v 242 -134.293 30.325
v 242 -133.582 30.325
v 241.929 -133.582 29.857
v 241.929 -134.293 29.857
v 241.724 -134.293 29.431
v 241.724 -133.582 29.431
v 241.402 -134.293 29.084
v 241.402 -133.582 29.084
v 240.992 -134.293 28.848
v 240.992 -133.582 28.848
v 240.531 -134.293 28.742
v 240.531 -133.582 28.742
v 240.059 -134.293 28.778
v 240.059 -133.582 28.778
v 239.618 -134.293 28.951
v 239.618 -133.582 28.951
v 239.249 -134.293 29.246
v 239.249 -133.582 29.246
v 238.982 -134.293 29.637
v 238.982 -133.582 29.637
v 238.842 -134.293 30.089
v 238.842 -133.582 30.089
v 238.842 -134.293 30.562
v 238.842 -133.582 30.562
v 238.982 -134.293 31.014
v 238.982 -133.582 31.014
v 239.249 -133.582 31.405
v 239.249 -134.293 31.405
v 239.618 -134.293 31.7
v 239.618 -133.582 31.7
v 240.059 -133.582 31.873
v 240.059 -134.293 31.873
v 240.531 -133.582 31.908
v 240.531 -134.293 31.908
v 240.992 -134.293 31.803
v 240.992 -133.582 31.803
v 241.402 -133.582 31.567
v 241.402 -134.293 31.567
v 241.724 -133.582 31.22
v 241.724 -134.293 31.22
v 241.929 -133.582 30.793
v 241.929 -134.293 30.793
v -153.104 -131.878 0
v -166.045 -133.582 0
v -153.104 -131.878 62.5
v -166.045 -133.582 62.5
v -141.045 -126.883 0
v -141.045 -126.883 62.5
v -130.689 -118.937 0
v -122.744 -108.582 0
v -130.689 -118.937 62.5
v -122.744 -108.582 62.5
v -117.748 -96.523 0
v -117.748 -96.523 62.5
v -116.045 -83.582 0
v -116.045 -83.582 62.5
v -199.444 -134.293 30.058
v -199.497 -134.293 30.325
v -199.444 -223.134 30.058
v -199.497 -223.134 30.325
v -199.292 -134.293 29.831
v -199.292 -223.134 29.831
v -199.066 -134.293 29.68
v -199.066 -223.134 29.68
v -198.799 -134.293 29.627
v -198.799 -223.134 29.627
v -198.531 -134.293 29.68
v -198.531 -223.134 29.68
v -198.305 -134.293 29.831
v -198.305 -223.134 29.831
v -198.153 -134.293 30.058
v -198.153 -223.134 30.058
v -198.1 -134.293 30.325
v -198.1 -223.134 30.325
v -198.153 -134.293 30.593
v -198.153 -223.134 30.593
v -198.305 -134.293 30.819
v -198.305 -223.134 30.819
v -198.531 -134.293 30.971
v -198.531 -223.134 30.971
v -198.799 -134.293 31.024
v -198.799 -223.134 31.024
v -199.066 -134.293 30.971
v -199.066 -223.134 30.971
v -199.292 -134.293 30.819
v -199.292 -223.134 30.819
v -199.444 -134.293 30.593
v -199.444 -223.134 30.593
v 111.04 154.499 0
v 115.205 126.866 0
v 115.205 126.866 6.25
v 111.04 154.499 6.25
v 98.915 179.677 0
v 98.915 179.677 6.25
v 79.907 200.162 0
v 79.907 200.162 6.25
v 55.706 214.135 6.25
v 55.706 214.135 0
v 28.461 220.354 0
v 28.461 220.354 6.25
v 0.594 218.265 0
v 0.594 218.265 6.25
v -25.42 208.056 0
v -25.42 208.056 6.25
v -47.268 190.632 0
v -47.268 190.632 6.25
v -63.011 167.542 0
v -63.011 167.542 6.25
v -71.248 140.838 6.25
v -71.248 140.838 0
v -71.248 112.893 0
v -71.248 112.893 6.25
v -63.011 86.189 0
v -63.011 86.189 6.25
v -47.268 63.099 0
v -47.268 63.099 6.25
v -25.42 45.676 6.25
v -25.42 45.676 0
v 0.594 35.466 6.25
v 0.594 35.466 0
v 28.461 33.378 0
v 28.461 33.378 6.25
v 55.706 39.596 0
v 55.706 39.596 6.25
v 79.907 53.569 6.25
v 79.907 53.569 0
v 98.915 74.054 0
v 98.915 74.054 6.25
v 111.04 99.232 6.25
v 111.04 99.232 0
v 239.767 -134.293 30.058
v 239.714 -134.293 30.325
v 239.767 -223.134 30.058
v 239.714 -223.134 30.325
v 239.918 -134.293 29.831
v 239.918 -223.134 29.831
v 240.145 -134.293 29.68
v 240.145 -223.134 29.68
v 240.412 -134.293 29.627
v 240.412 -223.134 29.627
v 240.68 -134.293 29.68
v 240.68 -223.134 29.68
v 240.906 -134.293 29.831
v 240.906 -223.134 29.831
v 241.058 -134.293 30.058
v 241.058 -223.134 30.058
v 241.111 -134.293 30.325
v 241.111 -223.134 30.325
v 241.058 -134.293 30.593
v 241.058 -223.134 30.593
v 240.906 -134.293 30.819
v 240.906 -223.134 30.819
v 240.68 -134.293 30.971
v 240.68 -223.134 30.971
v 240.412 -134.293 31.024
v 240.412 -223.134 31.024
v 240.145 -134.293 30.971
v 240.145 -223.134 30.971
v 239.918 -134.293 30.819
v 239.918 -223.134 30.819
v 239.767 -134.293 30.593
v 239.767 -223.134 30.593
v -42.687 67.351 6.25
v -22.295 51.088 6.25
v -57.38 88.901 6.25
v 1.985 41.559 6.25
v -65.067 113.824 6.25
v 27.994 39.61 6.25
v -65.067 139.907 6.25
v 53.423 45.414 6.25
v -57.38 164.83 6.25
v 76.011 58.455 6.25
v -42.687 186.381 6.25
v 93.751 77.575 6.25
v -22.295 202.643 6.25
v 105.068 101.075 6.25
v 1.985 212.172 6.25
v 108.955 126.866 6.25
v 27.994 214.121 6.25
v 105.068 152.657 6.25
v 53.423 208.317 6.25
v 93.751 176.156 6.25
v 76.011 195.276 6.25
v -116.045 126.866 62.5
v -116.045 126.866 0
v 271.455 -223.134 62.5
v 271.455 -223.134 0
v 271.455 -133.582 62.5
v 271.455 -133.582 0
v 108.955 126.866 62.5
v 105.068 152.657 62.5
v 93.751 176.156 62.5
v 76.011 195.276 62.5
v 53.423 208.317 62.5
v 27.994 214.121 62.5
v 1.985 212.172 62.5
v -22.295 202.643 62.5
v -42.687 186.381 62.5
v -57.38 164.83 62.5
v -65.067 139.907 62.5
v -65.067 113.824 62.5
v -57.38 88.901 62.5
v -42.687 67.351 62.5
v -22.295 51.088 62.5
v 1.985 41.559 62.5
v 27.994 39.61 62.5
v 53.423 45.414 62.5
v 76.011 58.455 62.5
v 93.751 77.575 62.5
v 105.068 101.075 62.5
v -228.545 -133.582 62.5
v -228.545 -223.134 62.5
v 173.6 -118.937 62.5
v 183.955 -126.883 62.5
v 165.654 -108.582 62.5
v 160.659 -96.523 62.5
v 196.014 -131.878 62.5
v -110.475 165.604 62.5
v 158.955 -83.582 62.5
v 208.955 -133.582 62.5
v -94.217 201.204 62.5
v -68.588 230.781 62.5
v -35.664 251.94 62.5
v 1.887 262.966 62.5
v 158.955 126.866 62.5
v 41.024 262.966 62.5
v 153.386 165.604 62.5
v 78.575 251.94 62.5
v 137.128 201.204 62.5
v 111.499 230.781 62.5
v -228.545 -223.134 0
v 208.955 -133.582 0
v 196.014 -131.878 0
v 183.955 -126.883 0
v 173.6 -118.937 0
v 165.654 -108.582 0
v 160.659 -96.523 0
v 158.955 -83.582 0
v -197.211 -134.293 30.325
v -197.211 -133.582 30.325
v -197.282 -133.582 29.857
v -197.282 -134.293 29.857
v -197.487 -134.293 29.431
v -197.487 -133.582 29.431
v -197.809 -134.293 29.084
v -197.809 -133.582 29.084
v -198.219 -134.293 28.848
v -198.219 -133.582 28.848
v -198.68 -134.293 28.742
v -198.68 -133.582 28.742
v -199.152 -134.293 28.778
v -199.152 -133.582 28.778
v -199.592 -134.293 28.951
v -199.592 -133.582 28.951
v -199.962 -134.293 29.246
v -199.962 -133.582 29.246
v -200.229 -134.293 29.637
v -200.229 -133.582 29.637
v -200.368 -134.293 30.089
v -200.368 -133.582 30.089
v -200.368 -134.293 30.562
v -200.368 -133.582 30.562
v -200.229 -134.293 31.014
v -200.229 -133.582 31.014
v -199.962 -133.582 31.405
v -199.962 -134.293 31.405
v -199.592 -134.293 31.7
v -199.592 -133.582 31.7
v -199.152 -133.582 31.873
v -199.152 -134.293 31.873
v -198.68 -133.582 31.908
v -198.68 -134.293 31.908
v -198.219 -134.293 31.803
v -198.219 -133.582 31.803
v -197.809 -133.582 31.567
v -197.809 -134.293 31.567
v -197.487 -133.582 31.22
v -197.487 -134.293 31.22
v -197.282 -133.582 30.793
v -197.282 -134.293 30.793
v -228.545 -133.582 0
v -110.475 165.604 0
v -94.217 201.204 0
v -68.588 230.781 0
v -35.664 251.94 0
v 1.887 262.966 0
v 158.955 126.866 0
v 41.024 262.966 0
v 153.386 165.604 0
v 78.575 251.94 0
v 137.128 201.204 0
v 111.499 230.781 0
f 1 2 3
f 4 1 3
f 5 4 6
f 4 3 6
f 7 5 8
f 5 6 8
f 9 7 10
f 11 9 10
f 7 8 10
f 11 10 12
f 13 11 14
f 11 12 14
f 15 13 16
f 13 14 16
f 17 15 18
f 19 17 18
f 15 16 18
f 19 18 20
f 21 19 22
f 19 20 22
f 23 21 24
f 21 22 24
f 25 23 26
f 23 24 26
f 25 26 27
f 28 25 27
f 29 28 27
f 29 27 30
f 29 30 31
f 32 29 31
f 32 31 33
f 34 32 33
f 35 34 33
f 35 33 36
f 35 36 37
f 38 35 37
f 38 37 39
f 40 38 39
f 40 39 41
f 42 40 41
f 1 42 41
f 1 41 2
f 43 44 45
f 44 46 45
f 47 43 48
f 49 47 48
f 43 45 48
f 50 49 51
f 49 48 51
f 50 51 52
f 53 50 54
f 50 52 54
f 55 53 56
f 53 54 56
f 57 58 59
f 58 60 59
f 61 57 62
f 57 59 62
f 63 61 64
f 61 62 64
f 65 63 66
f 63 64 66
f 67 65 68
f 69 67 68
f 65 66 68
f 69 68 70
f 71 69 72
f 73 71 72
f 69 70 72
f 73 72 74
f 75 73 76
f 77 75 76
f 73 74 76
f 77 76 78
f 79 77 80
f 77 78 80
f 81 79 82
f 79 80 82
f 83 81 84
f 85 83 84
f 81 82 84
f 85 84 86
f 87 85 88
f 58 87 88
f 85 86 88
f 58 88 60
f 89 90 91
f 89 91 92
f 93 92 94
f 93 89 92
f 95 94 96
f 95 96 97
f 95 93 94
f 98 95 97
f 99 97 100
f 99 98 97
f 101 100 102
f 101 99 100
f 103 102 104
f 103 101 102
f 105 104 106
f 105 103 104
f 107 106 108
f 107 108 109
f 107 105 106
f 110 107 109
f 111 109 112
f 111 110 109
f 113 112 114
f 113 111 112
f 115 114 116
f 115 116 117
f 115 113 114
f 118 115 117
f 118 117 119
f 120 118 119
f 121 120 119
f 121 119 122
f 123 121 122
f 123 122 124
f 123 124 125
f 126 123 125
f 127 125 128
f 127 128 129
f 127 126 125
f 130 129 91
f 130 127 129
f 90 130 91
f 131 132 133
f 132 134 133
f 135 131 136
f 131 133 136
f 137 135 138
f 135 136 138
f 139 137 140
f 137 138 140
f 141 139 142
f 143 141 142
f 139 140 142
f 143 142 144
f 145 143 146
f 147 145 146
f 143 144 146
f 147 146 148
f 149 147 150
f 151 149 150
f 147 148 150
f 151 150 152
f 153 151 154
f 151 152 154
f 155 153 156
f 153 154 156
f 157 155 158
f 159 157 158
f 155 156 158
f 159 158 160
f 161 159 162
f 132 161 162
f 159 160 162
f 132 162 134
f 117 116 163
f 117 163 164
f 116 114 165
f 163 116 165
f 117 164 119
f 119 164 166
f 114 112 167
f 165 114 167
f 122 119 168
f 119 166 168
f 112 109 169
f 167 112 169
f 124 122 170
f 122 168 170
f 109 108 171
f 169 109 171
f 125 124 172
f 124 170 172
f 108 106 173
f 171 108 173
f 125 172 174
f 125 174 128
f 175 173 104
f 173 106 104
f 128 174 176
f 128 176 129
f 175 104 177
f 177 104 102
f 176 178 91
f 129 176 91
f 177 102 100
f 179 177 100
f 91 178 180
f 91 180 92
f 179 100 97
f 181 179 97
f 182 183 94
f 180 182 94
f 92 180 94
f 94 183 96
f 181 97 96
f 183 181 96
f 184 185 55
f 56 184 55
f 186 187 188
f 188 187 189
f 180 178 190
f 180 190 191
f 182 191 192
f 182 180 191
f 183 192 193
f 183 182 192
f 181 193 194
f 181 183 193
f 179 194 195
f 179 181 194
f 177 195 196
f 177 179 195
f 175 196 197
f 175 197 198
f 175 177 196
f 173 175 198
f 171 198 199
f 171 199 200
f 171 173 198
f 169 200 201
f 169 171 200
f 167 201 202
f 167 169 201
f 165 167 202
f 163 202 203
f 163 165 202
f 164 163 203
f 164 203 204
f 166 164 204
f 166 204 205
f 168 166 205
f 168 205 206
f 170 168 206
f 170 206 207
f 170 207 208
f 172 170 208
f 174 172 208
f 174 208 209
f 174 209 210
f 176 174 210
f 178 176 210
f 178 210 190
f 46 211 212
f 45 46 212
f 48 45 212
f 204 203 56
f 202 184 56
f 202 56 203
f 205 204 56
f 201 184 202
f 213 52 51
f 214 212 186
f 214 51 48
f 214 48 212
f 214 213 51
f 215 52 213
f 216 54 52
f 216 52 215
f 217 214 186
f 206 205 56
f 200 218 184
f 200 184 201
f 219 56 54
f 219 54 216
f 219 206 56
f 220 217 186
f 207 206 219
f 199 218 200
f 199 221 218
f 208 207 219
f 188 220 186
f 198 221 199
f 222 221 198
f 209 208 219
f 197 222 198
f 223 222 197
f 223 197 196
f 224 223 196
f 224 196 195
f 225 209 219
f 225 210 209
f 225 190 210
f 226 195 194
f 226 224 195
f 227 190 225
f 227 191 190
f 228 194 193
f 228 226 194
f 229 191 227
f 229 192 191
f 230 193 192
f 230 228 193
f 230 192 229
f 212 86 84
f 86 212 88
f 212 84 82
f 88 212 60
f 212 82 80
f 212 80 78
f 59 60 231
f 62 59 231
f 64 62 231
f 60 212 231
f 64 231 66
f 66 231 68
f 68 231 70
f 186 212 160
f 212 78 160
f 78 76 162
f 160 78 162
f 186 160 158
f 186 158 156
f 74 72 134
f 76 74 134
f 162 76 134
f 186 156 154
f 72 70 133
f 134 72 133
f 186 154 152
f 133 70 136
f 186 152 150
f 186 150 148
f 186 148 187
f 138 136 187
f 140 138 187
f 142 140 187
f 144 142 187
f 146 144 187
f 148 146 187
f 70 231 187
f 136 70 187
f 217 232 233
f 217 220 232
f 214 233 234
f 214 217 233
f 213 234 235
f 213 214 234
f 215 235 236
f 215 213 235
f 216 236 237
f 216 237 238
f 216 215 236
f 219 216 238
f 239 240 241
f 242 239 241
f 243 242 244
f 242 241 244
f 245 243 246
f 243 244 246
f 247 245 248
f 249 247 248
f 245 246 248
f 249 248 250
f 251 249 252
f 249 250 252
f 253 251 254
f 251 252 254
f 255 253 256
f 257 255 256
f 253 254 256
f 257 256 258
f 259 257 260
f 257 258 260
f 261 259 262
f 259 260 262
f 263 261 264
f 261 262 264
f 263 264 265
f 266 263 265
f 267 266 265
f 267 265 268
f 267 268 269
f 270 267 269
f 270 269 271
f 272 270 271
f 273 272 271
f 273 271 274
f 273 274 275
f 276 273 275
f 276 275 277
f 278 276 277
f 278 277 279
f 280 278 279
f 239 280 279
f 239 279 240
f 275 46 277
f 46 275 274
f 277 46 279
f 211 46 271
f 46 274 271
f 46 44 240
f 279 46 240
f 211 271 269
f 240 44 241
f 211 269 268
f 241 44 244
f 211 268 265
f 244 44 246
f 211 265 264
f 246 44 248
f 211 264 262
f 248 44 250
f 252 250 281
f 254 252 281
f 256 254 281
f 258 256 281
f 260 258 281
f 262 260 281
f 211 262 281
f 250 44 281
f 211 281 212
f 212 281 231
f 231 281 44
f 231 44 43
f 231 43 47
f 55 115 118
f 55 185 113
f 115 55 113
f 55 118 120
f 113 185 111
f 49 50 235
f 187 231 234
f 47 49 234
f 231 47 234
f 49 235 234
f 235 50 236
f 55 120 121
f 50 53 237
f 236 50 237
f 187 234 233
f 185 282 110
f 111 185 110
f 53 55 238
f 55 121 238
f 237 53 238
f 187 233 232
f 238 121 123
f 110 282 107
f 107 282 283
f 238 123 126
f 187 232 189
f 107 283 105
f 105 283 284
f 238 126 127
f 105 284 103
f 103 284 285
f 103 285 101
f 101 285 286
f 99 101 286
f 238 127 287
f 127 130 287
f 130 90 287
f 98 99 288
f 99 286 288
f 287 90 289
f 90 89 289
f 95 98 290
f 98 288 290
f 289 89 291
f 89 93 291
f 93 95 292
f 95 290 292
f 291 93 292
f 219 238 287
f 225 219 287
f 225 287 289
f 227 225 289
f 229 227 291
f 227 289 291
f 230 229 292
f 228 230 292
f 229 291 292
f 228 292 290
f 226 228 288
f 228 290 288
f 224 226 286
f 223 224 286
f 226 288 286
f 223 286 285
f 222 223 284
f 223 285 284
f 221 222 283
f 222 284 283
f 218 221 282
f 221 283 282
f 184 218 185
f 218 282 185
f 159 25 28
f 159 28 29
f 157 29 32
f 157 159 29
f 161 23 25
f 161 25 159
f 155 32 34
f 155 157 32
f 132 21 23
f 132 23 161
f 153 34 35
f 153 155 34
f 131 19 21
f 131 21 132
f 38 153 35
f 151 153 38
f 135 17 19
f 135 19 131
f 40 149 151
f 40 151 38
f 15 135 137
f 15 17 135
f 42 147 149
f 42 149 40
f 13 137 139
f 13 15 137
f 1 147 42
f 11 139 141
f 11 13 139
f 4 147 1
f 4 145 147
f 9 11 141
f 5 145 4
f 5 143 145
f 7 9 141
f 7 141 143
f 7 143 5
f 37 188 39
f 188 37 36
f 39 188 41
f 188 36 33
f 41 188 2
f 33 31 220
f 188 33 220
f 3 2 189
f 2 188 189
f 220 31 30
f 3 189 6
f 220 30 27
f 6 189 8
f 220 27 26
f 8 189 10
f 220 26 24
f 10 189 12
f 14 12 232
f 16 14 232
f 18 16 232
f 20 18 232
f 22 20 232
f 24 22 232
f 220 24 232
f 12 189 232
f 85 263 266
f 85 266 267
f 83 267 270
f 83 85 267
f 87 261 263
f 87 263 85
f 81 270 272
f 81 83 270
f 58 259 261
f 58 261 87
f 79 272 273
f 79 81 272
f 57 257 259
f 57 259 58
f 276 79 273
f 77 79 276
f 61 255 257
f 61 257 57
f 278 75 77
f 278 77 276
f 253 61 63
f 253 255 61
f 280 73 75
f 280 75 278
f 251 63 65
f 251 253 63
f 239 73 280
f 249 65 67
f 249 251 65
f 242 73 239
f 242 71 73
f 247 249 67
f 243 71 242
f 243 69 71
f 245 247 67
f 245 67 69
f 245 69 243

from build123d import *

# Parameters (mm, degrees)
SKETCH1_R                                           = 87.5
BOSS_EXTRUDE1_DEPTH                                 = 62.5
FILLET1_R                                           = 50
SKETCH2_R                                           = 93.75
CUT_EXTRUDE3_DEPTH                                  = 6.25
CBORE_FOR_00_BINDING_HEAD_MACHINE_SCREW_D           = 1.397
CBORE_FOR_00_BINDING_HEAD_MACHINE_SCREW_CBORE_D     = 3.175
CBORE_FOR_00_BINDING_HEAD_MACHINE_SCREW_CBORE_DEPTH = 0.7112


with BuildPart() as part:
    # Sketch1 → Boss-Extrude1 (new body)
    with BuildSketch(Plane.XY):
        with BuildLine():
            Line((-228.544776119, -223.134328358), (271.455223881, -223.134328358))
            Line((271.455223881, -223.134328358), (271.455223881, -133.582089552))
            Line((271.455223881, -133.582089552), (158.955223881, -133.582089552))
            Line((158.955223881, -133.582089552), (158.955223881, 126.865671642))
            ThreePointArc((158.955223881, 126.865671642), (21.455223881, 264.365671642), (-116.044776119, 126.865671642))
            Line((-116.044776119, 126.865671642), (-116.044776119, -133.582089552))
            Line((-116.044776119, -133.582089552), (-228.544776119, -133.582089552))
            Line((-228.544776119, -133.582089552), (-228.544776119, -223.134328358))
        make_face()
        with Locations((21.455223881, 126.865671642)):
            Circle(SKETCH1_R, mode=Mode.SUBTRACT)
    extrude(amount=BOSS_EXTRUDE1_DEPTH)

    # Fillet1
    fillet1_edges = [part.edges().sort_by_distance(p)[0] for p in [
        (-116.044776119, -133.582089552, 31.25),
        (158.955223881, -133.582089552, 31.25),
    ]]
    fillet(fillet1_edges, radius=FILLET1_R)

    # Sketch2 → Cut-Extrude3 (cut)
    with BuildSketch(Plane.XY):
        with Locations((21.455223881, 126.865671642)):
            Circle(SKETCH2_R)
    extrude(amount=CUT_EXTRUDE3_DEPTH, mode=Mode.SUBTRACT)

    # CBORE for #00 Binding Head Machine Screw1 (through all)
    with Locations(Plane(origin=(0, -133.582089552, 0), x_dir=(1, 0, 0), z_dir=(0, 1, 0))):
        with Locations((-198.798502654, -30.325345844), (240.412221484, -30.325345844)):
            CounterBoreHole(CBORE_FOR_00_BINDING_HEAD_MACHINE_SCREW_D / 2, CBORE_FOR_00_BINDING_HEAD_MACHINE_SCREW_CBORE_D / 2, CBORE_FOR_00_BINDING_HEAD_MACHINE_SCREW_CBORE_DEPTH)


solid = part.part
